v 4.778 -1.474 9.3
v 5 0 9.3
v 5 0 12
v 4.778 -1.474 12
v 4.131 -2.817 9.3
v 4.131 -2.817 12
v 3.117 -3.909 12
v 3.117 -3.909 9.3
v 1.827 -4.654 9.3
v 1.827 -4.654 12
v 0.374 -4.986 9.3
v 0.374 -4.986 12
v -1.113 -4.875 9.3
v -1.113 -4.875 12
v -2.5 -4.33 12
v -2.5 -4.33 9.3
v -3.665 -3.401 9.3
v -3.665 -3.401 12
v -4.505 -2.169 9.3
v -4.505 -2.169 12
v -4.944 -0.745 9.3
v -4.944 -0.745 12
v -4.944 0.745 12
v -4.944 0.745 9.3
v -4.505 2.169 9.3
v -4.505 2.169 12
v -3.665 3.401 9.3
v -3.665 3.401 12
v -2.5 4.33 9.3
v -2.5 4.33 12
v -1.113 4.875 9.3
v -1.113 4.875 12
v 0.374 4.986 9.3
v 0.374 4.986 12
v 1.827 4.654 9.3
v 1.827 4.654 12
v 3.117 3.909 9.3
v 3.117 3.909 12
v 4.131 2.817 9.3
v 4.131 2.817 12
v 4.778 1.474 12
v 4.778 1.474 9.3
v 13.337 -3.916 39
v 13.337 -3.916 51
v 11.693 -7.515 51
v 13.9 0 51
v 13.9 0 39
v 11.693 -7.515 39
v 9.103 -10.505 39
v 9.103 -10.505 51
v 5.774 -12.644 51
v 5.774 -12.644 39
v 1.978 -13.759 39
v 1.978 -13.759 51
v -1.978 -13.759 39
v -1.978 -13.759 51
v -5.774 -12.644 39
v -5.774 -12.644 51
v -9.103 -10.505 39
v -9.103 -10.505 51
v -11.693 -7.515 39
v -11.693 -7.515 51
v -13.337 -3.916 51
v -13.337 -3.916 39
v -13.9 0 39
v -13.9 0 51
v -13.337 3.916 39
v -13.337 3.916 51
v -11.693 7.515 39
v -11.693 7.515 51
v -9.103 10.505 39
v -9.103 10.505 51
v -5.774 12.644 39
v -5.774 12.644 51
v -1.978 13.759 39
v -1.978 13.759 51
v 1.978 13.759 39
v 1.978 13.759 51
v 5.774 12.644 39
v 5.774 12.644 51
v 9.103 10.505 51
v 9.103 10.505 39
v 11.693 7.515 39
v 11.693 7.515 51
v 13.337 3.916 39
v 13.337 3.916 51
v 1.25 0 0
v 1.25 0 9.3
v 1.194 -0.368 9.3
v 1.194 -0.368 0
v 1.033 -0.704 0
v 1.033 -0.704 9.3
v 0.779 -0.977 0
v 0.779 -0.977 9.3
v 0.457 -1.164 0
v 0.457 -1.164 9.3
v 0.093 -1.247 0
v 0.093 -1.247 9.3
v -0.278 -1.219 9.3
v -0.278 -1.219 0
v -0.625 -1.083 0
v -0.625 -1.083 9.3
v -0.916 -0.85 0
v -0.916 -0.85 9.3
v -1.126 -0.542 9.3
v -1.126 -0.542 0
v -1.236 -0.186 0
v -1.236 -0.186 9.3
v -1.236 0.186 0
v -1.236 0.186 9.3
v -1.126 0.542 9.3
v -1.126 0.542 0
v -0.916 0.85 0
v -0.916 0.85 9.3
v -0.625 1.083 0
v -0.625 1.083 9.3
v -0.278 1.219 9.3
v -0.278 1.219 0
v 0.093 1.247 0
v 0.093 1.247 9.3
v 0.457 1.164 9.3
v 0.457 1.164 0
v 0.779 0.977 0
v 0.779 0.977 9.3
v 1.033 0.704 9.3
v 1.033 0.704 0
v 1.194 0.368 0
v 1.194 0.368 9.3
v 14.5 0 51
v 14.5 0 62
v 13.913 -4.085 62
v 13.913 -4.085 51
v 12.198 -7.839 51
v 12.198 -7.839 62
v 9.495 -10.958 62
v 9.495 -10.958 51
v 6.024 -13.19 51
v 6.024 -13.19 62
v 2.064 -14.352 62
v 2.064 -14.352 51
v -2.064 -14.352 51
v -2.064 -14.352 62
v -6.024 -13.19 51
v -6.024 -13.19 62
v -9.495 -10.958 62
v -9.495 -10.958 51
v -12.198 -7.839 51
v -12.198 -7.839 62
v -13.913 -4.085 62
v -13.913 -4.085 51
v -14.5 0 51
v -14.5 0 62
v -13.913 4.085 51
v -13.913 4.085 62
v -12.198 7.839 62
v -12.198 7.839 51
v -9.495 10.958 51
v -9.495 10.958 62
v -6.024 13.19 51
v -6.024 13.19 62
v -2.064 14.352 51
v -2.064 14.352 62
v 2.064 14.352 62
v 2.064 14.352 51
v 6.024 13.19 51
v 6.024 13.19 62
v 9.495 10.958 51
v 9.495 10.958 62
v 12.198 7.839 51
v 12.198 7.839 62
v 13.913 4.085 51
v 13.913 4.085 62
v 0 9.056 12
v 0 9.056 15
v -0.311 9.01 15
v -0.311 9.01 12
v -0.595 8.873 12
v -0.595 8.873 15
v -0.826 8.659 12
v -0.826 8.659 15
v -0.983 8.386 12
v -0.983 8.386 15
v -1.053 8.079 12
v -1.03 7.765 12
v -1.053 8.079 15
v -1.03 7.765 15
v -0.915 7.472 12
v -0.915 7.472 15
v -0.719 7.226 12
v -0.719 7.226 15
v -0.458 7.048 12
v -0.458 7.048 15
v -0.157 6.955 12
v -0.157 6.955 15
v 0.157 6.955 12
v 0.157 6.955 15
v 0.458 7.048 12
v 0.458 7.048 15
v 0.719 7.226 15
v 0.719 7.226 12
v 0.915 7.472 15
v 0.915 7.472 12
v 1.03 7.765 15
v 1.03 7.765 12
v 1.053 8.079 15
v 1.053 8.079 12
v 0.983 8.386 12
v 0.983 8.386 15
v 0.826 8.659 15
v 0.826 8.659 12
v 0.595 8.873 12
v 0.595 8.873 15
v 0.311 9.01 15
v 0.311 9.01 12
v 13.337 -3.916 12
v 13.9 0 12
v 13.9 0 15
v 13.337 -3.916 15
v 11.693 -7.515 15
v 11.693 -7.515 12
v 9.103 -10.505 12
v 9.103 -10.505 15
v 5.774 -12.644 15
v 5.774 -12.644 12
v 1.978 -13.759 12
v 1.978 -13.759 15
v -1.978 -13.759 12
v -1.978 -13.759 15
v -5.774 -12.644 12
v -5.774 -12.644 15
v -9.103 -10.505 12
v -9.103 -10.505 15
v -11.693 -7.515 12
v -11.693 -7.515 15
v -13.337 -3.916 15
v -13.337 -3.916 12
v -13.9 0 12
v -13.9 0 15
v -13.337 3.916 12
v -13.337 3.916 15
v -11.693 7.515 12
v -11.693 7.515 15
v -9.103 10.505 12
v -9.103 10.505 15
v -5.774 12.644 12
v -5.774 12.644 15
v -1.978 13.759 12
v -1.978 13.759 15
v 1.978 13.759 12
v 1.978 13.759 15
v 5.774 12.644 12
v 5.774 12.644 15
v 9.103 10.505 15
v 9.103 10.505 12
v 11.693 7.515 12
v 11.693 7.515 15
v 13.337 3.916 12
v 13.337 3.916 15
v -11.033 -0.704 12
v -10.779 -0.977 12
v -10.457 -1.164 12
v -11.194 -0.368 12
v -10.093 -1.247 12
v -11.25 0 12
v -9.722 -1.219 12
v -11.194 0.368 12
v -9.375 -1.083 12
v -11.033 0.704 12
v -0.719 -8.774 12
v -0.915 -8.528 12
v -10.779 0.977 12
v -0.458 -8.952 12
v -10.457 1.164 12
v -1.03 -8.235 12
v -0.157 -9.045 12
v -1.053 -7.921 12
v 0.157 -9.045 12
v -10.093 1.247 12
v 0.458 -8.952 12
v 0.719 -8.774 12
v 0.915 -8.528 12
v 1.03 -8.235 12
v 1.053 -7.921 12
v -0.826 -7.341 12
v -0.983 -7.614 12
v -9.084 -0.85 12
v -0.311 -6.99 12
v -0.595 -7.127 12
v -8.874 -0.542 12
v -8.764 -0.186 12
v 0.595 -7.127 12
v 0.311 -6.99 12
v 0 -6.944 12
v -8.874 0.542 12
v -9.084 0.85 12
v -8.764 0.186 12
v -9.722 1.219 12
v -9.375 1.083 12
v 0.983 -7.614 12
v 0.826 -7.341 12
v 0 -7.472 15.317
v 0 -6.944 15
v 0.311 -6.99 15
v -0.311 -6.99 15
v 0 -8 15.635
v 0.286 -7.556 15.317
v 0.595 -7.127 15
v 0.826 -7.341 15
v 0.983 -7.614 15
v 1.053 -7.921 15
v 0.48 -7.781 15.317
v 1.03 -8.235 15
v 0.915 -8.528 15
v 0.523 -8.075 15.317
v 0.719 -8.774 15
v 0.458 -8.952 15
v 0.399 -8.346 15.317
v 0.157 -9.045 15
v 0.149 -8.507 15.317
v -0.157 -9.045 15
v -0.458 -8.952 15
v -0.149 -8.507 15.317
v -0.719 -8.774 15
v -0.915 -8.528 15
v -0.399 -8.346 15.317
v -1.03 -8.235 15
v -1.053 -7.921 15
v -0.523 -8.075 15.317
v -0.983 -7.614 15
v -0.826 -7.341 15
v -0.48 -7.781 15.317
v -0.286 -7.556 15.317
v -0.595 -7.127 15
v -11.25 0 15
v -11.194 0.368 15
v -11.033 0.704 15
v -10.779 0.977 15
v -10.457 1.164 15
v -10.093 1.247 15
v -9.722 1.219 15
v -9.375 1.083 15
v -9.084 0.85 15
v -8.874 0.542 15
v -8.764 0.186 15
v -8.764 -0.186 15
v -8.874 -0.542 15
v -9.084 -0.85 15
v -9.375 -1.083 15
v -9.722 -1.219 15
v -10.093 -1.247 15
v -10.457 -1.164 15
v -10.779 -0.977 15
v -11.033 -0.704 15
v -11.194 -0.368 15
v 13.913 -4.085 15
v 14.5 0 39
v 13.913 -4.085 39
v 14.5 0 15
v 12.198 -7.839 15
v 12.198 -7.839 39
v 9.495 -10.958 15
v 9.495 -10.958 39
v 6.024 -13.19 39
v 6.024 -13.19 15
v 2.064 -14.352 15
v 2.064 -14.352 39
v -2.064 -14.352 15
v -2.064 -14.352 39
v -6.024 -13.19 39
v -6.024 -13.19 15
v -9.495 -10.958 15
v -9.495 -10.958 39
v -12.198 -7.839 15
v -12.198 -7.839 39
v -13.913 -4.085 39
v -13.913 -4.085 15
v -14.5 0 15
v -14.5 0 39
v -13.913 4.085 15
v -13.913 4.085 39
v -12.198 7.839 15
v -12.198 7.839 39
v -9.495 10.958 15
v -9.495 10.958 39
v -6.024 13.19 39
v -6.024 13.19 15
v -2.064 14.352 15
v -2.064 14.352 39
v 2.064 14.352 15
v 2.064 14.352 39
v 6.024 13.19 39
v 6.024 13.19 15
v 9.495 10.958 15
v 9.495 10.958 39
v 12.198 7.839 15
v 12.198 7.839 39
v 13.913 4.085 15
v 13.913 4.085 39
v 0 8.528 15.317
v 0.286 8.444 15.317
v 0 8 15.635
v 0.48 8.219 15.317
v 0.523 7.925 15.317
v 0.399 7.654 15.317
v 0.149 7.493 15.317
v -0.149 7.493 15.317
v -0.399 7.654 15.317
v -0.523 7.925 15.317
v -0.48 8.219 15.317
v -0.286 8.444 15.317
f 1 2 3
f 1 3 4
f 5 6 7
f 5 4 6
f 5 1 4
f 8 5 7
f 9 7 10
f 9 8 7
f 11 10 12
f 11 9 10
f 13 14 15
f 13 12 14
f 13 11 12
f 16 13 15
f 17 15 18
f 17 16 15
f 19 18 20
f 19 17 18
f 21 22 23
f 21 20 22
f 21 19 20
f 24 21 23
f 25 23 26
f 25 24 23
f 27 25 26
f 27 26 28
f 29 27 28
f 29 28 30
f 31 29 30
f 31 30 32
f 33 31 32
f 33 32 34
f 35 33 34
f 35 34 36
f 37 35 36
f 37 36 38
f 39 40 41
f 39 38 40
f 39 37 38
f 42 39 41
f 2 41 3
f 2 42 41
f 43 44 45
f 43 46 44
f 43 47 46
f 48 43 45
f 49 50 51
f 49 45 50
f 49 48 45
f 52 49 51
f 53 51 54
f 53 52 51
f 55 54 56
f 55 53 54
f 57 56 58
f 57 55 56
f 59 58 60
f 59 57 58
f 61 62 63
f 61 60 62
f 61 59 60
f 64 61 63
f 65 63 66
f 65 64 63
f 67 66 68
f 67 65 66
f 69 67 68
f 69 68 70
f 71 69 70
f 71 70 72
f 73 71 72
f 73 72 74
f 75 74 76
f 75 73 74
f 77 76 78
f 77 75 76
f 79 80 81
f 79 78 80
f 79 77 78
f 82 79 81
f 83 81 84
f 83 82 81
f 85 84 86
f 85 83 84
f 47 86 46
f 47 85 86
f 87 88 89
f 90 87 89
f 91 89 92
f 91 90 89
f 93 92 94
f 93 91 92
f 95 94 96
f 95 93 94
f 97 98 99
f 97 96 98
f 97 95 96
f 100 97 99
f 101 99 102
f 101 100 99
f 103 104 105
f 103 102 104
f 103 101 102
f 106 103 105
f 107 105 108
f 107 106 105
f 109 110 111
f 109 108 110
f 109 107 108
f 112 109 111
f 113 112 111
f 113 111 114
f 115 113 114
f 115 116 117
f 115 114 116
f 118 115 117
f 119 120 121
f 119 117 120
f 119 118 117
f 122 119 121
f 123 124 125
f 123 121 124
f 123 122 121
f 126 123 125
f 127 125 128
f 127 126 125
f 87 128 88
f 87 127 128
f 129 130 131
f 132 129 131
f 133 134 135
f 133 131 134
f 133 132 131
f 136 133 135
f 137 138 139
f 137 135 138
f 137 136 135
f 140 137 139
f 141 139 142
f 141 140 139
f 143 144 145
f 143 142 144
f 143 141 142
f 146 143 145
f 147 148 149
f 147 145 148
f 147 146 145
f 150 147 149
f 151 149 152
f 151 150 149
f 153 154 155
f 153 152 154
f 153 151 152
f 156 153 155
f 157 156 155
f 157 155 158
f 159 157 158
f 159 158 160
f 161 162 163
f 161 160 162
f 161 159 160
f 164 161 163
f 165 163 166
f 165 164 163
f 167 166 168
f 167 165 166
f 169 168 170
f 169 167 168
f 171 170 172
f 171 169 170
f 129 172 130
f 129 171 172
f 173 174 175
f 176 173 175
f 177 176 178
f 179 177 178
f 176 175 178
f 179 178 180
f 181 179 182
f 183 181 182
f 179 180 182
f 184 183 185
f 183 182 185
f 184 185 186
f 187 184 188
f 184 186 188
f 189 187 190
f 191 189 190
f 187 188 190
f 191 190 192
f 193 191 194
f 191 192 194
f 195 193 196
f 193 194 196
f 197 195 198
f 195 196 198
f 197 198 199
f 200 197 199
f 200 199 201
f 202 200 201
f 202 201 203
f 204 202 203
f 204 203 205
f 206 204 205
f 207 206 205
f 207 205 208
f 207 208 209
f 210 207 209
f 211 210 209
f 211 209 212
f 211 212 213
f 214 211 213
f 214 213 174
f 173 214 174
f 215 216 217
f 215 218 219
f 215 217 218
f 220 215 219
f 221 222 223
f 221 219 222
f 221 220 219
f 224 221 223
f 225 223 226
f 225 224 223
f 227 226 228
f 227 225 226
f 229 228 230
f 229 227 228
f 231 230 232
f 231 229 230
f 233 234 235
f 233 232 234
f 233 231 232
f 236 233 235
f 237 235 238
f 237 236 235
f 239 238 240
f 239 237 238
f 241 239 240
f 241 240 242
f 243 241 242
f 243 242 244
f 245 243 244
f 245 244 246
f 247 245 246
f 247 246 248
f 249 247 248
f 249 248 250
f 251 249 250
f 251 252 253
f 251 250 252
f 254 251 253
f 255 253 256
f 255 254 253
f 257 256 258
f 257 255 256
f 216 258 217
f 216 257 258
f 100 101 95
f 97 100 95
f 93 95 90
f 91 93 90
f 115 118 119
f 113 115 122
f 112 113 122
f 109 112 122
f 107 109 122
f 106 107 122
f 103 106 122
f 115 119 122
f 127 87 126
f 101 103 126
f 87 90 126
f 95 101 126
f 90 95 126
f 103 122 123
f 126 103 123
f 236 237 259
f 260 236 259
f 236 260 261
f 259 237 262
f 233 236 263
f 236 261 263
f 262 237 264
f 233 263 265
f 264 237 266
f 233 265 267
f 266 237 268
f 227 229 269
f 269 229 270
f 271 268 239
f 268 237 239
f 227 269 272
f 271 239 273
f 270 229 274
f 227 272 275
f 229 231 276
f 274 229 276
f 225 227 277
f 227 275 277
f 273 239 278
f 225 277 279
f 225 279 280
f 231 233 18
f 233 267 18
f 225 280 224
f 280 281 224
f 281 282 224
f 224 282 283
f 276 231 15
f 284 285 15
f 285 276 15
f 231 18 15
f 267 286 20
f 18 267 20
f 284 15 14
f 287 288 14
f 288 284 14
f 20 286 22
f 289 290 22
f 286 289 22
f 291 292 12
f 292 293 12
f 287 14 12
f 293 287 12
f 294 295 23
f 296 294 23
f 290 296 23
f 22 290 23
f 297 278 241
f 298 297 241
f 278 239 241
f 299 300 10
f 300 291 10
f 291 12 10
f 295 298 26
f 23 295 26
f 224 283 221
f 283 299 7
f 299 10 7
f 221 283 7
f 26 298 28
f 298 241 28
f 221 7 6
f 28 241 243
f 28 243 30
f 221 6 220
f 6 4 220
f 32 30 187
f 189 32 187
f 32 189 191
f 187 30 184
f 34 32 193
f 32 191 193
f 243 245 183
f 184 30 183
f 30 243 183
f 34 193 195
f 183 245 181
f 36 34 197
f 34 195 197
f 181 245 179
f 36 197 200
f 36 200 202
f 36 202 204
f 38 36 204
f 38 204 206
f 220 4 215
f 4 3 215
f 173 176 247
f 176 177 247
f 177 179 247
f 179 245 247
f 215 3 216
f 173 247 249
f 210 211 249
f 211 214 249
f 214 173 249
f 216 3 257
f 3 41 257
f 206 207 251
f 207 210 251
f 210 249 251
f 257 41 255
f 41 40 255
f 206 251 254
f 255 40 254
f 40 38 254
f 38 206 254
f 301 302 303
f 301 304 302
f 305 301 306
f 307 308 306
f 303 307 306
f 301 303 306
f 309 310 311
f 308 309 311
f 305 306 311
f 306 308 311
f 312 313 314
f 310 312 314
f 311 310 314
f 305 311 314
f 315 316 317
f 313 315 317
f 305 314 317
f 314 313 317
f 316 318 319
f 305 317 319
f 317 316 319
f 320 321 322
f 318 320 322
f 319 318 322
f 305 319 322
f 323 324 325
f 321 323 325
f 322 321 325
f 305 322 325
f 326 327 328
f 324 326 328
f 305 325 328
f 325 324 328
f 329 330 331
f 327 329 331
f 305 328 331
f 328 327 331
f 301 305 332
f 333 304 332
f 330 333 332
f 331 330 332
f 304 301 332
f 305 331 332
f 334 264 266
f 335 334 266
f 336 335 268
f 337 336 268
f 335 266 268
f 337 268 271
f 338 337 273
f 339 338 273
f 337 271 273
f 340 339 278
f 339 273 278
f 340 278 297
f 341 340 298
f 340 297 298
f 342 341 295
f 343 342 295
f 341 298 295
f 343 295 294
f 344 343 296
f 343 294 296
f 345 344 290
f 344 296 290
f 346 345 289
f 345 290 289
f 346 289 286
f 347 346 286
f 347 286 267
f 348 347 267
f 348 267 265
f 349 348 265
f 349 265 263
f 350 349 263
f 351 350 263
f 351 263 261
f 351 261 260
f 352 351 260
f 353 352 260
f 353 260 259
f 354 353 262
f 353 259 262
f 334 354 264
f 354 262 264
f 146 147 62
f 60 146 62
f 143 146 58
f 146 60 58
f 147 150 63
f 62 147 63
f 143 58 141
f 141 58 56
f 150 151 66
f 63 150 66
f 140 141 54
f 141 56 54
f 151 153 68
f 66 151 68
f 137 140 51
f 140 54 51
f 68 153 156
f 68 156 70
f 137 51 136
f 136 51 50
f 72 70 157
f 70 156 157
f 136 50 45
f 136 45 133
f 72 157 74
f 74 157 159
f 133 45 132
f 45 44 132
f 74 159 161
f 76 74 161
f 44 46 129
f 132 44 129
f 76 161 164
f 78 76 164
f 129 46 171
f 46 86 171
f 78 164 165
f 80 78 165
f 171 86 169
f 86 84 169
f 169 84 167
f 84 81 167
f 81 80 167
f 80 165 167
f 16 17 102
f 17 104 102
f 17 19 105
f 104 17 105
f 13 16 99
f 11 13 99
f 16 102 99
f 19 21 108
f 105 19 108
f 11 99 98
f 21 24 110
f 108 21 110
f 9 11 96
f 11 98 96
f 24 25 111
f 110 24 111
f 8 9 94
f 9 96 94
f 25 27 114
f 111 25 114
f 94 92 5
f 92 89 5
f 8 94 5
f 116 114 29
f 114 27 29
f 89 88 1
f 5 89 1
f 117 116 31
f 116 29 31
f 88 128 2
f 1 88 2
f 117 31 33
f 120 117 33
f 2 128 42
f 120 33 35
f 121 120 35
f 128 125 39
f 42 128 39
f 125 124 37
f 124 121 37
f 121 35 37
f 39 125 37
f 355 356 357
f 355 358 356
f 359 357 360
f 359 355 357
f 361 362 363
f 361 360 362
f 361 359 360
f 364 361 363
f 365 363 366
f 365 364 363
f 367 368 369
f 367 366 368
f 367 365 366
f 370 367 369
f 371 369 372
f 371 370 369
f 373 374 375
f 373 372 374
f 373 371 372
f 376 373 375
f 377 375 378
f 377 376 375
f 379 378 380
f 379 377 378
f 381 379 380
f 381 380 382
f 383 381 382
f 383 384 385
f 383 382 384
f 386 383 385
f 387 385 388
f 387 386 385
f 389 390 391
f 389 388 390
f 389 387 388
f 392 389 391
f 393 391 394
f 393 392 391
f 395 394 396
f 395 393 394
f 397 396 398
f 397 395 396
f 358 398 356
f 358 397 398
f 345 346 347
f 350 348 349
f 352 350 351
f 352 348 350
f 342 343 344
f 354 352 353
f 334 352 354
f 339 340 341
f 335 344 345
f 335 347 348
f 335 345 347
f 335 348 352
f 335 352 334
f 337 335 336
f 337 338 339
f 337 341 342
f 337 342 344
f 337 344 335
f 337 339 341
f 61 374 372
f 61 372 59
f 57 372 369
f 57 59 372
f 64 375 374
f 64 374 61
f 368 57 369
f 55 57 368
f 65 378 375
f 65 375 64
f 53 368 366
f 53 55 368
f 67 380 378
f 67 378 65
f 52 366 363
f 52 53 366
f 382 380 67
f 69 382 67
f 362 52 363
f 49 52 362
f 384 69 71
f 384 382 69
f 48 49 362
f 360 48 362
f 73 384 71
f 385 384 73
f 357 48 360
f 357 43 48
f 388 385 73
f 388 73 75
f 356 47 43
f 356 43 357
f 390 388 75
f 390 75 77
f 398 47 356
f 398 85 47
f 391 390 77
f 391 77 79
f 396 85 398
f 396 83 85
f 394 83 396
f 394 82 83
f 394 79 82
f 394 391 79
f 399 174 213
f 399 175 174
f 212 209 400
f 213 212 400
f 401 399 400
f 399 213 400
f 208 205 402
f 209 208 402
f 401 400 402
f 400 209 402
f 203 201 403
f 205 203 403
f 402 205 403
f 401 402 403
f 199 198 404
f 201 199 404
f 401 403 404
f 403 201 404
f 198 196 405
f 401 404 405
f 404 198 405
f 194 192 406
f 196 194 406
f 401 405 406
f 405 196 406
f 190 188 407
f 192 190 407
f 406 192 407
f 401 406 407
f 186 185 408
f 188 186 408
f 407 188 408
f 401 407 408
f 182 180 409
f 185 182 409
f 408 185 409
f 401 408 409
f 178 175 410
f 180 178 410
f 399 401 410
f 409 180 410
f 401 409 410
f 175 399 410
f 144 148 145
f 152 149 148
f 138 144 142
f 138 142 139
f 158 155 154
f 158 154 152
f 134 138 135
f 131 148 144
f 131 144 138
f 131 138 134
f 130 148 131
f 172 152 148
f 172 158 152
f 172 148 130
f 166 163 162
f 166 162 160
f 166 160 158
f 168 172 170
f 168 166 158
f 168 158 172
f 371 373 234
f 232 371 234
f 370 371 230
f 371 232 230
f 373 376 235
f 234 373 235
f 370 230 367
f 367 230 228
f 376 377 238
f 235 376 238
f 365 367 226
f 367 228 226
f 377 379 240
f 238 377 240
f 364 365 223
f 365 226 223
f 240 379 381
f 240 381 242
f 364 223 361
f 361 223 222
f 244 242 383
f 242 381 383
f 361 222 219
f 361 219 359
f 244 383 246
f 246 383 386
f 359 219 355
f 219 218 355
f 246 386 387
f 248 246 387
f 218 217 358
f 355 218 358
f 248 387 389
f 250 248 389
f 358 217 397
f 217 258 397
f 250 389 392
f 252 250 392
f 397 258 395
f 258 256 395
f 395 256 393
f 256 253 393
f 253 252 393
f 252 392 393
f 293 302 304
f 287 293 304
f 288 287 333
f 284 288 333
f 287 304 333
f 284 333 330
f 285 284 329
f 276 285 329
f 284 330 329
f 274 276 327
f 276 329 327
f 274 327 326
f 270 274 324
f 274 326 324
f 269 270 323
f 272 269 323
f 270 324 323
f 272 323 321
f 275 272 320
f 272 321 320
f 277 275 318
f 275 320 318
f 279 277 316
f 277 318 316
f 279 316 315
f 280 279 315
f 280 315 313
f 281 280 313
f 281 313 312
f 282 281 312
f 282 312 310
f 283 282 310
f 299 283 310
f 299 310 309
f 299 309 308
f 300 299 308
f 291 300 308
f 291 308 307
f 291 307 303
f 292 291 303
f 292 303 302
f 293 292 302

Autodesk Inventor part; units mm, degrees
ref_plane "YZ Plane" through (0, 0, 0) normal (1, 0, 0) x (0, 1, 0)
ref_plane "XZ Plane" through (0, 0, 0) normal (0, 1, 0) x (-1, 0, 0)
ref_plane "XY Plane" through (0, 0, 0) normal (0, 0, 1) x (1, 0, 0)
sketch "スケッチ1" plane through (0, 0, 0) normal (0, 0, 1) x (1, 0, 0)
  circle A0 centre (0, 0) radius 1.25
  dimension "d0" = 2.5
extrude "押し出し1" add sketch "スケッチ1" along normal blind 9.3
sketch "スケッチ2" plane through (0, 0, 9.3) normal (0, 0, 1) x (1, 0, 0)
  circle A0 centre (0, 0) radius 5
  dimension "d3" = 10
extrude "押し出し2" add sketch "スケッチ2" along normal blind 2.7
sketch "スケッチ3" plane through (0, 0, 12) normal (0, 0, 1) x (1, 0, 0)
  circle A0 centre (0, 0) radius 5 projected
  circle A1 centre (0, 0) radius 13.9
  dimension "d6" = 27.8
extrude "押し出し3" add sketch "スケッチ3" along normal blind 3 contours A0 | A1
sketch "スケッチ4" plane through (0, 0, 15) normal (0, 0, 1) x (1, 0, 0)
  circle A0 centre (0, 0) radius 1.25 projected
  circle A1 centre (0, 0) radius 14.5
  dimension "d9" = 29
extrude "押し出し4" add sketch "スケッチ4" along normal blind 24 contours A0 | A1
sketch "スケッチ5" plane through (0, 0, 39) normal (0, 0, 1) x (1, 0, 0)
  circle A0 centre (0, 0) radius 13.9
  dimension "d12" = 27.8
extrude "押し出し5" add sketch "スケッチ5" along normal blind 12
sketch "スケッチ6" plane through (0, 0, 51) normal (0, 0, 1) x (1, 0, 0)
  circle A0 centre (0, 0) radius 14.5
  dimension "d15" = 29
extrude "押し出し6" add sketch "スケッチ6" along normal blind 11
sketch "スケッチ7" plane through (0, 0, 12) normal (0, 0, -1) x (-1, 0, 0)
  point P0 (0, 0)
  point P1 (0, -8)
  point P2 (0, 8)
  dimension "d18" = 16
  dimension "d19" = 8
hole "穴1" at (0, -8, 12) at (0, 8, 12) direction (0, 0, 1) diameter 2.1129 depth 3 tip angle 118 thread size "M2.6x0.45" class "6H" standard "ANSI Metric M Profile"
sketch "スケッチ8" plane through (0, 0, 12) normal (0, 0, -1) x (-1, 0, 0)
  circle A0 centre (10, 0) radius 1.25
  point P0 (0, 0)
  dimension "d27" = 2.5
  dimension "d28" = 10
extrude "押し出し7" cut sketch "スケッチ8" against normal blind 3
equation "\"d19\" = 0.5 * d18"
properties part number "RD008_モータ(DMN29)" material "鉄、鋳鉄"
